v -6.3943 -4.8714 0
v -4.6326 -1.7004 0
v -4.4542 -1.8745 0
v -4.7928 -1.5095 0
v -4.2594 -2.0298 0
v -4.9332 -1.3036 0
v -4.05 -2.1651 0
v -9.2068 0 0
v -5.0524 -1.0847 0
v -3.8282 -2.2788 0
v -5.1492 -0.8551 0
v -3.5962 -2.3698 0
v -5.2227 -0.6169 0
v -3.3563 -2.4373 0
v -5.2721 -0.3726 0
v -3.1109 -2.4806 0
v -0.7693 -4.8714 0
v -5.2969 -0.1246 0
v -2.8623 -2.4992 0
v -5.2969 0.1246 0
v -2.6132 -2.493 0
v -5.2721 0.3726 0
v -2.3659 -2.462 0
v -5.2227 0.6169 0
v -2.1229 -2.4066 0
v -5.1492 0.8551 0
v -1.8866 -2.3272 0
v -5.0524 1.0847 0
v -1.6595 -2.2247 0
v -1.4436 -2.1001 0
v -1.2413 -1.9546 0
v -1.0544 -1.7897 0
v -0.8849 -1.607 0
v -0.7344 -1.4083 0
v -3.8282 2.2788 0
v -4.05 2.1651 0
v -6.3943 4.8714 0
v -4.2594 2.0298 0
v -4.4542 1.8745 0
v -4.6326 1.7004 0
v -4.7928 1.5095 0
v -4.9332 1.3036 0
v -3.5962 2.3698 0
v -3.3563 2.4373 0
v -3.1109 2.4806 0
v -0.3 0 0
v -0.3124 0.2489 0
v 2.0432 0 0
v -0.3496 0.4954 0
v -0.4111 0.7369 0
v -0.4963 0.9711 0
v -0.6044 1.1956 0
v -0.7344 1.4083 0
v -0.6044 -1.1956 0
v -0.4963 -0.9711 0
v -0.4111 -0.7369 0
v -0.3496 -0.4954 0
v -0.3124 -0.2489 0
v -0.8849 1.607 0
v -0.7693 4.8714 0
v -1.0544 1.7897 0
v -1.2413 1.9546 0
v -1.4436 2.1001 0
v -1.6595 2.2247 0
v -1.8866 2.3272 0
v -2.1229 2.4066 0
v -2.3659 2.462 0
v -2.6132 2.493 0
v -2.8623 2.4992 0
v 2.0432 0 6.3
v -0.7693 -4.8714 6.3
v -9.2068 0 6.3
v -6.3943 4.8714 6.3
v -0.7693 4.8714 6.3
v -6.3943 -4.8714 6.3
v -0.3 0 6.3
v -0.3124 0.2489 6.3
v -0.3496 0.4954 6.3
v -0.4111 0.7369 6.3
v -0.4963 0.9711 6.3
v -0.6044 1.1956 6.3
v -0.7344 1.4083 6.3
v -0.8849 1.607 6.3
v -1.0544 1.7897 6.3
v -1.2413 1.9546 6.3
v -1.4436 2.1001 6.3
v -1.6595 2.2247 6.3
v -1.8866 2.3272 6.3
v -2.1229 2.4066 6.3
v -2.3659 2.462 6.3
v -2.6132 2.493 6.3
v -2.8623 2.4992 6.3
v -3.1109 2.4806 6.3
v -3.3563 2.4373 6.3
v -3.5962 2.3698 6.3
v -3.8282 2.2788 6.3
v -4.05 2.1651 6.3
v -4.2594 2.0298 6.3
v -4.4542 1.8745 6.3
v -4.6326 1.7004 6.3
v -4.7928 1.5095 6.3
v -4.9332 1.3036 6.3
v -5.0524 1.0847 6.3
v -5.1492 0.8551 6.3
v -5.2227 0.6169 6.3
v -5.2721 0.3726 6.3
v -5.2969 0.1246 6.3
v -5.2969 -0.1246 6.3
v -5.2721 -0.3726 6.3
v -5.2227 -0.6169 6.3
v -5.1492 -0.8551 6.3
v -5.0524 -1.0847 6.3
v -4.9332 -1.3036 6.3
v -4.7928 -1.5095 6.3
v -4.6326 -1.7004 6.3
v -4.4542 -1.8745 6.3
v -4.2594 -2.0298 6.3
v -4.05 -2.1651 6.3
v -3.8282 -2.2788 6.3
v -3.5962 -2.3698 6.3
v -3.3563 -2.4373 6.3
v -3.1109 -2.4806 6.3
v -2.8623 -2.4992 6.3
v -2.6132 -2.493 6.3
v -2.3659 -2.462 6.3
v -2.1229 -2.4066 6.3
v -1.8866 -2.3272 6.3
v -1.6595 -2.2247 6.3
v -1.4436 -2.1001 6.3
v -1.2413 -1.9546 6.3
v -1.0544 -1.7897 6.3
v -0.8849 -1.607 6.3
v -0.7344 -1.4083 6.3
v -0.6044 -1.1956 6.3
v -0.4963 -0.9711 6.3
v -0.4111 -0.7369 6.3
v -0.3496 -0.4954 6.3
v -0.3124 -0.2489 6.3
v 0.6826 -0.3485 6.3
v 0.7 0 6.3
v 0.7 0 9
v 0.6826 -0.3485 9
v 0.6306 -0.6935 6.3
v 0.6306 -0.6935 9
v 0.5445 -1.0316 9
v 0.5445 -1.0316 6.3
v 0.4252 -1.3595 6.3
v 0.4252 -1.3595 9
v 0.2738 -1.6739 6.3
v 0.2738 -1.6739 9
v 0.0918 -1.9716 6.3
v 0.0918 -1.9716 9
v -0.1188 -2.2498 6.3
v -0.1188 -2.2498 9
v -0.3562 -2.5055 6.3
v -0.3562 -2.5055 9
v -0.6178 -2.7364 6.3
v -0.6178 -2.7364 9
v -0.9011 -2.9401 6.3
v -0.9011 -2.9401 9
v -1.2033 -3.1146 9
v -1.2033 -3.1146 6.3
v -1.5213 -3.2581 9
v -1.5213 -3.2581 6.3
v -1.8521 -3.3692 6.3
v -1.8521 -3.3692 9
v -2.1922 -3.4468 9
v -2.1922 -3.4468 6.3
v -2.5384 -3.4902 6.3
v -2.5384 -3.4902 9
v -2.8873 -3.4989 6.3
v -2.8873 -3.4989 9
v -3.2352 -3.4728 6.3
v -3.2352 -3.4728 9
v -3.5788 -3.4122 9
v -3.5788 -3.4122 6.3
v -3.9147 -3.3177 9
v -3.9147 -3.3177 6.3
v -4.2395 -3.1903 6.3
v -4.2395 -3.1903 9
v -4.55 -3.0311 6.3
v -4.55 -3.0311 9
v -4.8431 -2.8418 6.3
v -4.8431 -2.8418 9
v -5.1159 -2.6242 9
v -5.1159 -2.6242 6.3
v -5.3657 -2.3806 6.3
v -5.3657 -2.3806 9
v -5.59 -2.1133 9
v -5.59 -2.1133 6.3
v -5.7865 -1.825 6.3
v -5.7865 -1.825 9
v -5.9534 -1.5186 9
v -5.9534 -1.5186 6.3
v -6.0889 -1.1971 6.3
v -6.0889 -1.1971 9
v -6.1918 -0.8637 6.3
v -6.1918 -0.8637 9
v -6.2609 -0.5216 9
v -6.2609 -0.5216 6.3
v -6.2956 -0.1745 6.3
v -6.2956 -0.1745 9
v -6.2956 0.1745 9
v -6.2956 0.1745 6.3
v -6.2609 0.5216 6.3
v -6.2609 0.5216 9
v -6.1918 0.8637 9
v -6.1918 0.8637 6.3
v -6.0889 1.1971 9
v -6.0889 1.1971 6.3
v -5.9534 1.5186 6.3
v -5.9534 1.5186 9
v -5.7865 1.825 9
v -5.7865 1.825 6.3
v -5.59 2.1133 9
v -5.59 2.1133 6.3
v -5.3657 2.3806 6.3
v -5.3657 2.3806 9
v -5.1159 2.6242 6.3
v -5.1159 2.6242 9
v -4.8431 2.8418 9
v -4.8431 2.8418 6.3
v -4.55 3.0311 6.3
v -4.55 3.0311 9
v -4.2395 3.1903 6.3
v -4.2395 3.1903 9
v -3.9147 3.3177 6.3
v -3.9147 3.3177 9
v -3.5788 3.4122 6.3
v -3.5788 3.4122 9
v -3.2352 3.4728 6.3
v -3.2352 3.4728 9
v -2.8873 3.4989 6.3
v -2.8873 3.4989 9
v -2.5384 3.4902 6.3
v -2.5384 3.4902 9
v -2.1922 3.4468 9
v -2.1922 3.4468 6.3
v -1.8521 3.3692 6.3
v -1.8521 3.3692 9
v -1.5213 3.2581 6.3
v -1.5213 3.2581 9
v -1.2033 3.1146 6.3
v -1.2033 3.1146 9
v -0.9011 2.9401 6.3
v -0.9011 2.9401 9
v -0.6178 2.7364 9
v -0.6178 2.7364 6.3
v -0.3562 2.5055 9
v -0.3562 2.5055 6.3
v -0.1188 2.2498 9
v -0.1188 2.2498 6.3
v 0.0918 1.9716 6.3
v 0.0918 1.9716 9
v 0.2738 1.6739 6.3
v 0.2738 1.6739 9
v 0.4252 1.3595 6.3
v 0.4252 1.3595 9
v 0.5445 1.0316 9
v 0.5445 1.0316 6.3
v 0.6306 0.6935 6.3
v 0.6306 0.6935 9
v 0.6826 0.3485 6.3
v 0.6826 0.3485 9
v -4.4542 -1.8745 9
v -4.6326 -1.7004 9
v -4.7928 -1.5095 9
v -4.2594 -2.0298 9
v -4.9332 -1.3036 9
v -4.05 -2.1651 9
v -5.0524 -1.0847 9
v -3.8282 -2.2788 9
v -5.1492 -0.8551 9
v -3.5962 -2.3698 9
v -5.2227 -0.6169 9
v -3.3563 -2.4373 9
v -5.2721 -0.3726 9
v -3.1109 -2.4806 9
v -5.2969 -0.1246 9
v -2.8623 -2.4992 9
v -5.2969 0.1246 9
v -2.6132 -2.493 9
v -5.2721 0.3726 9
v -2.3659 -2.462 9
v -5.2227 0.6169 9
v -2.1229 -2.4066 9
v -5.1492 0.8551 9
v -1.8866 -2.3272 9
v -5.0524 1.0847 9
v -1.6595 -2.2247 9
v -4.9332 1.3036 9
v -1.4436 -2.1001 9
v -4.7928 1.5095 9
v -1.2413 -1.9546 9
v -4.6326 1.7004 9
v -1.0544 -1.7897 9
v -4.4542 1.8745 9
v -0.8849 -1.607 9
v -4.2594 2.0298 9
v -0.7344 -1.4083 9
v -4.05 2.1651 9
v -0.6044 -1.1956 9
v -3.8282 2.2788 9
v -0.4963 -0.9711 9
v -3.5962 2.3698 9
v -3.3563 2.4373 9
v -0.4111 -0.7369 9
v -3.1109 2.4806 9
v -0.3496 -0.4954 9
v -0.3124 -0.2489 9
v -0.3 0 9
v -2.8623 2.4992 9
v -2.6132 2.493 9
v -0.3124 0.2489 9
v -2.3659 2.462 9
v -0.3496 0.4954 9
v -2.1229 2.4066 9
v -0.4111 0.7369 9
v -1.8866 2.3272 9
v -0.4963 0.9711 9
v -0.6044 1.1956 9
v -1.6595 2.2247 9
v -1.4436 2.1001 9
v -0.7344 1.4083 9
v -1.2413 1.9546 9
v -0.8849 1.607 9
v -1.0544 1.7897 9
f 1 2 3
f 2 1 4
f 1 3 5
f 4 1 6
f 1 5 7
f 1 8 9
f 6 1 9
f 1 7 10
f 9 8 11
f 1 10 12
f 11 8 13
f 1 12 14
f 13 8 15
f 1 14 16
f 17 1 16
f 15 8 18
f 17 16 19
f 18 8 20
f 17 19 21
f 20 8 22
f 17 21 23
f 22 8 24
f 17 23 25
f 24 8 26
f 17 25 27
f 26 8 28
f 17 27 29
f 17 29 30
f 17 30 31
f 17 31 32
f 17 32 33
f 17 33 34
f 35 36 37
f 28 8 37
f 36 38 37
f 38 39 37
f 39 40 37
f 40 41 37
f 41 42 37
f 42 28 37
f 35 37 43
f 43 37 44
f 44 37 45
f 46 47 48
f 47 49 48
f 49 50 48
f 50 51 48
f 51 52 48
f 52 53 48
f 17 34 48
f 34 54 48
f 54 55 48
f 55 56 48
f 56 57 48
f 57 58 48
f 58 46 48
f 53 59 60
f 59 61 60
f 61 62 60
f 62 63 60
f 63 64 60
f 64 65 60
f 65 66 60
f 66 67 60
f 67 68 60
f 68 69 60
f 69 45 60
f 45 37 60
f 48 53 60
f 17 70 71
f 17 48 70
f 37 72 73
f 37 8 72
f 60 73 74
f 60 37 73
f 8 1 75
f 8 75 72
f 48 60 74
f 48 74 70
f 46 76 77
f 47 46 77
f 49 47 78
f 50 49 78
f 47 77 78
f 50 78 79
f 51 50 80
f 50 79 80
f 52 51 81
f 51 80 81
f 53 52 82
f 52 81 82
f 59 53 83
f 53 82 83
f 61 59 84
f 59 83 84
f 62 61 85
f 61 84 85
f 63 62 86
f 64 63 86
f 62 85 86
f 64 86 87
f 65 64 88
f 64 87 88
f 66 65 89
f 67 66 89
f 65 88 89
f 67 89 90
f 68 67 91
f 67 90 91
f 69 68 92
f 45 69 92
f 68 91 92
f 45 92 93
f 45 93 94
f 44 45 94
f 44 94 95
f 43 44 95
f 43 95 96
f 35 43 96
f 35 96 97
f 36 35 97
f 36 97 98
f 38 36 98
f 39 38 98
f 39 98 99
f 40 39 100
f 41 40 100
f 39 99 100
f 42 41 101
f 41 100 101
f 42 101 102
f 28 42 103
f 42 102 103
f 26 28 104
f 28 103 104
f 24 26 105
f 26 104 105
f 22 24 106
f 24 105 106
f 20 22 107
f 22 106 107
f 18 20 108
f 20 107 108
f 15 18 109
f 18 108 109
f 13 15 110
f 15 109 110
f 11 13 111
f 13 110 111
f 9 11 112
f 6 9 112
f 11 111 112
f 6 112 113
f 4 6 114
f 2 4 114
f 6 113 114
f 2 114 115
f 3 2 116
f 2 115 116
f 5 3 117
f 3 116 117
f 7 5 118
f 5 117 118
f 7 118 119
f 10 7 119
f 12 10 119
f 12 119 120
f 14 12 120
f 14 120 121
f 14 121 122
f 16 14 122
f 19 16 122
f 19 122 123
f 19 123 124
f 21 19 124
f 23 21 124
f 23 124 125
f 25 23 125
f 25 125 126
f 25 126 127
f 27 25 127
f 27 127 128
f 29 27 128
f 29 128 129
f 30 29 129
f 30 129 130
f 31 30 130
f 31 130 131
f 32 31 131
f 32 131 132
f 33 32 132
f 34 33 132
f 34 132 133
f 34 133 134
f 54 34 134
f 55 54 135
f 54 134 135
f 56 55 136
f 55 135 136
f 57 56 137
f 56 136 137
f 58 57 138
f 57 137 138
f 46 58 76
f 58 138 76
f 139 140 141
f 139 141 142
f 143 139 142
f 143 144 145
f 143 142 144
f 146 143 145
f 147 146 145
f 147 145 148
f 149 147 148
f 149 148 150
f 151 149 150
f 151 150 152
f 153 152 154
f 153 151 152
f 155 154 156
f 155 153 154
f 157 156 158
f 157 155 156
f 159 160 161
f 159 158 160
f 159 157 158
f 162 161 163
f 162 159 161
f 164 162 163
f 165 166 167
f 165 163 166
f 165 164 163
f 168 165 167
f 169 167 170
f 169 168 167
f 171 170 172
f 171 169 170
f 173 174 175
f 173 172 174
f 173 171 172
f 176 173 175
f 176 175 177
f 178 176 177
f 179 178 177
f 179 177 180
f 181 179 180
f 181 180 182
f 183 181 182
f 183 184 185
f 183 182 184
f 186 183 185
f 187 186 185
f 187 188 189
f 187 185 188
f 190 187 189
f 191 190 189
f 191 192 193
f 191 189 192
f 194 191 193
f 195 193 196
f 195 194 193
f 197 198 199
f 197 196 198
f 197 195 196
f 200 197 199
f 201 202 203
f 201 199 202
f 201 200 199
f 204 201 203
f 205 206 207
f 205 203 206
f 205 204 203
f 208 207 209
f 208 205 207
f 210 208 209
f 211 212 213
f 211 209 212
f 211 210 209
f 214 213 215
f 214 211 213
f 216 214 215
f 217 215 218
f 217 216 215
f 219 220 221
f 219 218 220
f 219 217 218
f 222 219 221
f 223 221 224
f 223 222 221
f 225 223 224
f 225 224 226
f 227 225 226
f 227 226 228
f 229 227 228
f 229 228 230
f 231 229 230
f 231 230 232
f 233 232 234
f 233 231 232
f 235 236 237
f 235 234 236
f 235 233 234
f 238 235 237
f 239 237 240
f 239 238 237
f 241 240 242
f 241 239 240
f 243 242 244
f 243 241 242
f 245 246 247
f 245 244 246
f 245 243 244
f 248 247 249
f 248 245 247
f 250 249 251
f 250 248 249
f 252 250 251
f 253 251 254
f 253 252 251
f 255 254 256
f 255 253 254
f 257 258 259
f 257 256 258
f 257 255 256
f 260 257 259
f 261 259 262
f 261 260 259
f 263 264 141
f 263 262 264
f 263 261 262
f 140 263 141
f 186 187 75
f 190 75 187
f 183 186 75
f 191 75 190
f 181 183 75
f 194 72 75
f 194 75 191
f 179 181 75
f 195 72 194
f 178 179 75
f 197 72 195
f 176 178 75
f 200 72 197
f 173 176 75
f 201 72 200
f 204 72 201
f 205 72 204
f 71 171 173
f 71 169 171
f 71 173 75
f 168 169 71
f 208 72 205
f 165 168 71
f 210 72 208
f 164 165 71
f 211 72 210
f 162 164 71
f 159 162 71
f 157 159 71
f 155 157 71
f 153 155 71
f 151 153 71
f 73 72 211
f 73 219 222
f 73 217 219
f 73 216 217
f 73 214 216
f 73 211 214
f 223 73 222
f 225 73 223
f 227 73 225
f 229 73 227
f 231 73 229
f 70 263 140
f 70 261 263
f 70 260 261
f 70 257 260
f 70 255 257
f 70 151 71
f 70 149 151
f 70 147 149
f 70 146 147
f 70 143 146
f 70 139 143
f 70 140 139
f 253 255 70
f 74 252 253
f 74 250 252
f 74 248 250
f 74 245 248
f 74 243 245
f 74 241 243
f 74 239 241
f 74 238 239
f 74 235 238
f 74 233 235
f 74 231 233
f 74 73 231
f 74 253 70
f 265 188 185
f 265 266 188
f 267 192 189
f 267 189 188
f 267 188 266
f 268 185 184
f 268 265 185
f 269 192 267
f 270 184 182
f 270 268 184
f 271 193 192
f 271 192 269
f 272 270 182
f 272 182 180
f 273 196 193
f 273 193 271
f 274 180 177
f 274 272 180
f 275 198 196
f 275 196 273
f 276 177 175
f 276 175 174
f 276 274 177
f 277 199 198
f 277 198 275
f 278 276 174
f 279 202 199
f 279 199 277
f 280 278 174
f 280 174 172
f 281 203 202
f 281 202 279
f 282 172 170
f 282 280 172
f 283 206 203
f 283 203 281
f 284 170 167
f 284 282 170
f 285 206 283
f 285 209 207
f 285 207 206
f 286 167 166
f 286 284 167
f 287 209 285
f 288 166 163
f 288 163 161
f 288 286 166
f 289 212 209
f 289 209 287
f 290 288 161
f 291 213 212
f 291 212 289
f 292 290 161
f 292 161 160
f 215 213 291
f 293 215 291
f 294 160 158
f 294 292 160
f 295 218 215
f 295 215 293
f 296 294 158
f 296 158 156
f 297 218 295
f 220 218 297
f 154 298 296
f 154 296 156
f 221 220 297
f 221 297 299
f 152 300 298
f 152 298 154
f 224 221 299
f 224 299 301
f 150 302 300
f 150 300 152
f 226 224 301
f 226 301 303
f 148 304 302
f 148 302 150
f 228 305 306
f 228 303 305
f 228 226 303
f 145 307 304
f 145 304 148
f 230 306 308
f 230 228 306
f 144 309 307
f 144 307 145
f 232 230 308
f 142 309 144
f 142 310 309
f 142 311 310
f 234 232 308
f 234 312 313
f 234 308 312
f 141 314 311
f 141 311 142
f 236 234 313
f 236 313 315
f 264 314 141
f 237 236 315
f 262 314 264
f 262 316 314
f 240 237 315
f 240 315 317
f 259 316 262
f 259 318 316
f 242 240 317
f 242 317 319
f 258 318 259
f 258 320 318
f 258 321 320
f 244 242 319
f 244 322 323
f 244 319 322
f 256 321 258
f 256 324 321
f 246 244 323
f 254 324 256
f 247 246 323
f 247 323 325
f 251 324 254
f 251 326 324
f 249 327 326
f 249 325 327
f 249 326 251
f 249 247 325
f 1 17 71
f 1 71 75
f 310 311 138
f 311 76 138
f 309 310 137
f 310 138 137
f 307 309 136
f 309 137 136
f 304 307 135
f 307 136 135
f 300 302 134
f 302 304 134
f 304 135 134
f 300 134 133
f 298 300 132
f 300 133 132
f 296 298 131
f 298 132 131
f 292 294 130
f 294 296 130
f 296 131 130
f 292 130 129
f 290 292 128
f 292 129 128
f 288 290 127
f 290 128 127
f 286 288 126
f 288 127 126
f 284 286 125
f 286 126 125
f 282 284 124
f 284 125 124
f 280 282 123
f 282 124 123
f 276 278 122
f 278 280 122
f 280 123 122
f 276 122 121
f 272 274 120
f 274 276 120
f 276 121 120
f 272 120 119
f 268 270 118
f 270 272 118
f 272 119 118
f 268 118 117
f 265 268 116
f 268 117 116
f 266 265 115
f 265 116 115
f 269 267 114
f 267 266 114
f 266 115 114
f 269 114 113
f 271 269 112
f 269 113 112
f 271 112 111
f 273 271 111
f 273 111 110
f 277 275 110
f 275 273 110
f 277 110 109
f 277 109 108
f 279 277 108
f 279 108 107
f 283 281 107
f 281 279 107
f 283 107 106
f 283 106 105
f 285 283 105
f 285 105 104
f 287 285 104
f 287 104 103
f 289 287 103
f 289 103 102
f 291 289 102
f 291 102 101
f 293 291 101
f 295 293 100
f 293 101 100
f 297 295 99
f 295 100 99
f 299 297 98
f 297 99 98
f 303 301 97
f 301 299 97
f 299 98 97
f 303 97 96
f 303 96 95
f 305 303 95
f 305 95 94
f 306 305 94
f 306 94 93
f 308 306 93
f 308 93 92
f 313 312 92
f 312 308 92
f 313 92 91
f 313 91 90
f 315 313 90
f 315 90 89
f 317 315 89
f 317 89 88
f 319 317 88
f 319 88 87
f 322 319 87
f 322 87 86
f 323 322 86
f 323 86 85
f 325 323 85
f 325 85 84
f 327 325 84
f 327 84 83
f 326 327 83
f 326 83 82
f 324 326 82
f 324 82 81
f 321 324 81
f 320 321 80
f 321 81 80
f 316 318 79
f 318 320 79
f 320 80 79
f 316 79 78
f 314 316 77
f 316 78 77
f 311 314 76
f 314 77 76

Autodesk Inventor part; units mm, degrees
ref_plane "YZ Plane" through (0, 0, 0) normal (1, 0, 0) x (0, 1, 0)
ref_plane "XZ Plane" through (0, 0, 0) normal (0, 1, 0) x (-1, 0, 0)
ref_plane "XY Plane" through (0, 0, 0) normal (0, 0, 1) x (1, 0, 0)
sketch "Sketch1" plane through (0, 0, 0) normal (0, 0, 1) x (1, 0, 0)
  line L0 (-3.5818, 0) -> (-9.2068, 0)
  line L1 (-9.2068, 0) -> (-6.3943, 4.8714)
  line L2 (-6.3943, 4.8714) -> (-0.7693, 4.8714)
  line L3 (-0.7693, 4.8714) -> (2.0432, 0)
  line L4 (2.0432, 0) -> (-0.7693, -4.8714)
  line L5 (-0.7693, -4.8714) -> (-6.3943, -4.8714)
  line L6 (-6.3943, -4.8714) -> (-9.2068, 0)
  point P0 (-0.7818, 0)
  dimension "d0" = 5.625
extrude "Extrusion1" add sketch "Sketch1" along normal blind 6.3
sketch "Sketch2" plane through (0, 0, 6.3) normal (0, 0, 1) x (1, 0, 0)
  circle A0 centre (-2.8, 0) radius 2.5 projected
  circle A1 centre (-2.8, 0) radius 3.5
  point P0 (0, 0)
  dimension "d3" = 7
extrude "Extrusion2" add sketch "Sketch2" along normal blind 2.7
sketch "Sketch3" plane through (-2.8, 0, 6.3) normal (0, 0, 1) x (1, 0, 0)
  circle A0 centre (0, 0) radius 2.5 projected
  point P0 (2.8, 0)
extrude "Extrusion3" cut sketch "Sketch3" against normal through all
properties part number "Eccentric Spacer"
